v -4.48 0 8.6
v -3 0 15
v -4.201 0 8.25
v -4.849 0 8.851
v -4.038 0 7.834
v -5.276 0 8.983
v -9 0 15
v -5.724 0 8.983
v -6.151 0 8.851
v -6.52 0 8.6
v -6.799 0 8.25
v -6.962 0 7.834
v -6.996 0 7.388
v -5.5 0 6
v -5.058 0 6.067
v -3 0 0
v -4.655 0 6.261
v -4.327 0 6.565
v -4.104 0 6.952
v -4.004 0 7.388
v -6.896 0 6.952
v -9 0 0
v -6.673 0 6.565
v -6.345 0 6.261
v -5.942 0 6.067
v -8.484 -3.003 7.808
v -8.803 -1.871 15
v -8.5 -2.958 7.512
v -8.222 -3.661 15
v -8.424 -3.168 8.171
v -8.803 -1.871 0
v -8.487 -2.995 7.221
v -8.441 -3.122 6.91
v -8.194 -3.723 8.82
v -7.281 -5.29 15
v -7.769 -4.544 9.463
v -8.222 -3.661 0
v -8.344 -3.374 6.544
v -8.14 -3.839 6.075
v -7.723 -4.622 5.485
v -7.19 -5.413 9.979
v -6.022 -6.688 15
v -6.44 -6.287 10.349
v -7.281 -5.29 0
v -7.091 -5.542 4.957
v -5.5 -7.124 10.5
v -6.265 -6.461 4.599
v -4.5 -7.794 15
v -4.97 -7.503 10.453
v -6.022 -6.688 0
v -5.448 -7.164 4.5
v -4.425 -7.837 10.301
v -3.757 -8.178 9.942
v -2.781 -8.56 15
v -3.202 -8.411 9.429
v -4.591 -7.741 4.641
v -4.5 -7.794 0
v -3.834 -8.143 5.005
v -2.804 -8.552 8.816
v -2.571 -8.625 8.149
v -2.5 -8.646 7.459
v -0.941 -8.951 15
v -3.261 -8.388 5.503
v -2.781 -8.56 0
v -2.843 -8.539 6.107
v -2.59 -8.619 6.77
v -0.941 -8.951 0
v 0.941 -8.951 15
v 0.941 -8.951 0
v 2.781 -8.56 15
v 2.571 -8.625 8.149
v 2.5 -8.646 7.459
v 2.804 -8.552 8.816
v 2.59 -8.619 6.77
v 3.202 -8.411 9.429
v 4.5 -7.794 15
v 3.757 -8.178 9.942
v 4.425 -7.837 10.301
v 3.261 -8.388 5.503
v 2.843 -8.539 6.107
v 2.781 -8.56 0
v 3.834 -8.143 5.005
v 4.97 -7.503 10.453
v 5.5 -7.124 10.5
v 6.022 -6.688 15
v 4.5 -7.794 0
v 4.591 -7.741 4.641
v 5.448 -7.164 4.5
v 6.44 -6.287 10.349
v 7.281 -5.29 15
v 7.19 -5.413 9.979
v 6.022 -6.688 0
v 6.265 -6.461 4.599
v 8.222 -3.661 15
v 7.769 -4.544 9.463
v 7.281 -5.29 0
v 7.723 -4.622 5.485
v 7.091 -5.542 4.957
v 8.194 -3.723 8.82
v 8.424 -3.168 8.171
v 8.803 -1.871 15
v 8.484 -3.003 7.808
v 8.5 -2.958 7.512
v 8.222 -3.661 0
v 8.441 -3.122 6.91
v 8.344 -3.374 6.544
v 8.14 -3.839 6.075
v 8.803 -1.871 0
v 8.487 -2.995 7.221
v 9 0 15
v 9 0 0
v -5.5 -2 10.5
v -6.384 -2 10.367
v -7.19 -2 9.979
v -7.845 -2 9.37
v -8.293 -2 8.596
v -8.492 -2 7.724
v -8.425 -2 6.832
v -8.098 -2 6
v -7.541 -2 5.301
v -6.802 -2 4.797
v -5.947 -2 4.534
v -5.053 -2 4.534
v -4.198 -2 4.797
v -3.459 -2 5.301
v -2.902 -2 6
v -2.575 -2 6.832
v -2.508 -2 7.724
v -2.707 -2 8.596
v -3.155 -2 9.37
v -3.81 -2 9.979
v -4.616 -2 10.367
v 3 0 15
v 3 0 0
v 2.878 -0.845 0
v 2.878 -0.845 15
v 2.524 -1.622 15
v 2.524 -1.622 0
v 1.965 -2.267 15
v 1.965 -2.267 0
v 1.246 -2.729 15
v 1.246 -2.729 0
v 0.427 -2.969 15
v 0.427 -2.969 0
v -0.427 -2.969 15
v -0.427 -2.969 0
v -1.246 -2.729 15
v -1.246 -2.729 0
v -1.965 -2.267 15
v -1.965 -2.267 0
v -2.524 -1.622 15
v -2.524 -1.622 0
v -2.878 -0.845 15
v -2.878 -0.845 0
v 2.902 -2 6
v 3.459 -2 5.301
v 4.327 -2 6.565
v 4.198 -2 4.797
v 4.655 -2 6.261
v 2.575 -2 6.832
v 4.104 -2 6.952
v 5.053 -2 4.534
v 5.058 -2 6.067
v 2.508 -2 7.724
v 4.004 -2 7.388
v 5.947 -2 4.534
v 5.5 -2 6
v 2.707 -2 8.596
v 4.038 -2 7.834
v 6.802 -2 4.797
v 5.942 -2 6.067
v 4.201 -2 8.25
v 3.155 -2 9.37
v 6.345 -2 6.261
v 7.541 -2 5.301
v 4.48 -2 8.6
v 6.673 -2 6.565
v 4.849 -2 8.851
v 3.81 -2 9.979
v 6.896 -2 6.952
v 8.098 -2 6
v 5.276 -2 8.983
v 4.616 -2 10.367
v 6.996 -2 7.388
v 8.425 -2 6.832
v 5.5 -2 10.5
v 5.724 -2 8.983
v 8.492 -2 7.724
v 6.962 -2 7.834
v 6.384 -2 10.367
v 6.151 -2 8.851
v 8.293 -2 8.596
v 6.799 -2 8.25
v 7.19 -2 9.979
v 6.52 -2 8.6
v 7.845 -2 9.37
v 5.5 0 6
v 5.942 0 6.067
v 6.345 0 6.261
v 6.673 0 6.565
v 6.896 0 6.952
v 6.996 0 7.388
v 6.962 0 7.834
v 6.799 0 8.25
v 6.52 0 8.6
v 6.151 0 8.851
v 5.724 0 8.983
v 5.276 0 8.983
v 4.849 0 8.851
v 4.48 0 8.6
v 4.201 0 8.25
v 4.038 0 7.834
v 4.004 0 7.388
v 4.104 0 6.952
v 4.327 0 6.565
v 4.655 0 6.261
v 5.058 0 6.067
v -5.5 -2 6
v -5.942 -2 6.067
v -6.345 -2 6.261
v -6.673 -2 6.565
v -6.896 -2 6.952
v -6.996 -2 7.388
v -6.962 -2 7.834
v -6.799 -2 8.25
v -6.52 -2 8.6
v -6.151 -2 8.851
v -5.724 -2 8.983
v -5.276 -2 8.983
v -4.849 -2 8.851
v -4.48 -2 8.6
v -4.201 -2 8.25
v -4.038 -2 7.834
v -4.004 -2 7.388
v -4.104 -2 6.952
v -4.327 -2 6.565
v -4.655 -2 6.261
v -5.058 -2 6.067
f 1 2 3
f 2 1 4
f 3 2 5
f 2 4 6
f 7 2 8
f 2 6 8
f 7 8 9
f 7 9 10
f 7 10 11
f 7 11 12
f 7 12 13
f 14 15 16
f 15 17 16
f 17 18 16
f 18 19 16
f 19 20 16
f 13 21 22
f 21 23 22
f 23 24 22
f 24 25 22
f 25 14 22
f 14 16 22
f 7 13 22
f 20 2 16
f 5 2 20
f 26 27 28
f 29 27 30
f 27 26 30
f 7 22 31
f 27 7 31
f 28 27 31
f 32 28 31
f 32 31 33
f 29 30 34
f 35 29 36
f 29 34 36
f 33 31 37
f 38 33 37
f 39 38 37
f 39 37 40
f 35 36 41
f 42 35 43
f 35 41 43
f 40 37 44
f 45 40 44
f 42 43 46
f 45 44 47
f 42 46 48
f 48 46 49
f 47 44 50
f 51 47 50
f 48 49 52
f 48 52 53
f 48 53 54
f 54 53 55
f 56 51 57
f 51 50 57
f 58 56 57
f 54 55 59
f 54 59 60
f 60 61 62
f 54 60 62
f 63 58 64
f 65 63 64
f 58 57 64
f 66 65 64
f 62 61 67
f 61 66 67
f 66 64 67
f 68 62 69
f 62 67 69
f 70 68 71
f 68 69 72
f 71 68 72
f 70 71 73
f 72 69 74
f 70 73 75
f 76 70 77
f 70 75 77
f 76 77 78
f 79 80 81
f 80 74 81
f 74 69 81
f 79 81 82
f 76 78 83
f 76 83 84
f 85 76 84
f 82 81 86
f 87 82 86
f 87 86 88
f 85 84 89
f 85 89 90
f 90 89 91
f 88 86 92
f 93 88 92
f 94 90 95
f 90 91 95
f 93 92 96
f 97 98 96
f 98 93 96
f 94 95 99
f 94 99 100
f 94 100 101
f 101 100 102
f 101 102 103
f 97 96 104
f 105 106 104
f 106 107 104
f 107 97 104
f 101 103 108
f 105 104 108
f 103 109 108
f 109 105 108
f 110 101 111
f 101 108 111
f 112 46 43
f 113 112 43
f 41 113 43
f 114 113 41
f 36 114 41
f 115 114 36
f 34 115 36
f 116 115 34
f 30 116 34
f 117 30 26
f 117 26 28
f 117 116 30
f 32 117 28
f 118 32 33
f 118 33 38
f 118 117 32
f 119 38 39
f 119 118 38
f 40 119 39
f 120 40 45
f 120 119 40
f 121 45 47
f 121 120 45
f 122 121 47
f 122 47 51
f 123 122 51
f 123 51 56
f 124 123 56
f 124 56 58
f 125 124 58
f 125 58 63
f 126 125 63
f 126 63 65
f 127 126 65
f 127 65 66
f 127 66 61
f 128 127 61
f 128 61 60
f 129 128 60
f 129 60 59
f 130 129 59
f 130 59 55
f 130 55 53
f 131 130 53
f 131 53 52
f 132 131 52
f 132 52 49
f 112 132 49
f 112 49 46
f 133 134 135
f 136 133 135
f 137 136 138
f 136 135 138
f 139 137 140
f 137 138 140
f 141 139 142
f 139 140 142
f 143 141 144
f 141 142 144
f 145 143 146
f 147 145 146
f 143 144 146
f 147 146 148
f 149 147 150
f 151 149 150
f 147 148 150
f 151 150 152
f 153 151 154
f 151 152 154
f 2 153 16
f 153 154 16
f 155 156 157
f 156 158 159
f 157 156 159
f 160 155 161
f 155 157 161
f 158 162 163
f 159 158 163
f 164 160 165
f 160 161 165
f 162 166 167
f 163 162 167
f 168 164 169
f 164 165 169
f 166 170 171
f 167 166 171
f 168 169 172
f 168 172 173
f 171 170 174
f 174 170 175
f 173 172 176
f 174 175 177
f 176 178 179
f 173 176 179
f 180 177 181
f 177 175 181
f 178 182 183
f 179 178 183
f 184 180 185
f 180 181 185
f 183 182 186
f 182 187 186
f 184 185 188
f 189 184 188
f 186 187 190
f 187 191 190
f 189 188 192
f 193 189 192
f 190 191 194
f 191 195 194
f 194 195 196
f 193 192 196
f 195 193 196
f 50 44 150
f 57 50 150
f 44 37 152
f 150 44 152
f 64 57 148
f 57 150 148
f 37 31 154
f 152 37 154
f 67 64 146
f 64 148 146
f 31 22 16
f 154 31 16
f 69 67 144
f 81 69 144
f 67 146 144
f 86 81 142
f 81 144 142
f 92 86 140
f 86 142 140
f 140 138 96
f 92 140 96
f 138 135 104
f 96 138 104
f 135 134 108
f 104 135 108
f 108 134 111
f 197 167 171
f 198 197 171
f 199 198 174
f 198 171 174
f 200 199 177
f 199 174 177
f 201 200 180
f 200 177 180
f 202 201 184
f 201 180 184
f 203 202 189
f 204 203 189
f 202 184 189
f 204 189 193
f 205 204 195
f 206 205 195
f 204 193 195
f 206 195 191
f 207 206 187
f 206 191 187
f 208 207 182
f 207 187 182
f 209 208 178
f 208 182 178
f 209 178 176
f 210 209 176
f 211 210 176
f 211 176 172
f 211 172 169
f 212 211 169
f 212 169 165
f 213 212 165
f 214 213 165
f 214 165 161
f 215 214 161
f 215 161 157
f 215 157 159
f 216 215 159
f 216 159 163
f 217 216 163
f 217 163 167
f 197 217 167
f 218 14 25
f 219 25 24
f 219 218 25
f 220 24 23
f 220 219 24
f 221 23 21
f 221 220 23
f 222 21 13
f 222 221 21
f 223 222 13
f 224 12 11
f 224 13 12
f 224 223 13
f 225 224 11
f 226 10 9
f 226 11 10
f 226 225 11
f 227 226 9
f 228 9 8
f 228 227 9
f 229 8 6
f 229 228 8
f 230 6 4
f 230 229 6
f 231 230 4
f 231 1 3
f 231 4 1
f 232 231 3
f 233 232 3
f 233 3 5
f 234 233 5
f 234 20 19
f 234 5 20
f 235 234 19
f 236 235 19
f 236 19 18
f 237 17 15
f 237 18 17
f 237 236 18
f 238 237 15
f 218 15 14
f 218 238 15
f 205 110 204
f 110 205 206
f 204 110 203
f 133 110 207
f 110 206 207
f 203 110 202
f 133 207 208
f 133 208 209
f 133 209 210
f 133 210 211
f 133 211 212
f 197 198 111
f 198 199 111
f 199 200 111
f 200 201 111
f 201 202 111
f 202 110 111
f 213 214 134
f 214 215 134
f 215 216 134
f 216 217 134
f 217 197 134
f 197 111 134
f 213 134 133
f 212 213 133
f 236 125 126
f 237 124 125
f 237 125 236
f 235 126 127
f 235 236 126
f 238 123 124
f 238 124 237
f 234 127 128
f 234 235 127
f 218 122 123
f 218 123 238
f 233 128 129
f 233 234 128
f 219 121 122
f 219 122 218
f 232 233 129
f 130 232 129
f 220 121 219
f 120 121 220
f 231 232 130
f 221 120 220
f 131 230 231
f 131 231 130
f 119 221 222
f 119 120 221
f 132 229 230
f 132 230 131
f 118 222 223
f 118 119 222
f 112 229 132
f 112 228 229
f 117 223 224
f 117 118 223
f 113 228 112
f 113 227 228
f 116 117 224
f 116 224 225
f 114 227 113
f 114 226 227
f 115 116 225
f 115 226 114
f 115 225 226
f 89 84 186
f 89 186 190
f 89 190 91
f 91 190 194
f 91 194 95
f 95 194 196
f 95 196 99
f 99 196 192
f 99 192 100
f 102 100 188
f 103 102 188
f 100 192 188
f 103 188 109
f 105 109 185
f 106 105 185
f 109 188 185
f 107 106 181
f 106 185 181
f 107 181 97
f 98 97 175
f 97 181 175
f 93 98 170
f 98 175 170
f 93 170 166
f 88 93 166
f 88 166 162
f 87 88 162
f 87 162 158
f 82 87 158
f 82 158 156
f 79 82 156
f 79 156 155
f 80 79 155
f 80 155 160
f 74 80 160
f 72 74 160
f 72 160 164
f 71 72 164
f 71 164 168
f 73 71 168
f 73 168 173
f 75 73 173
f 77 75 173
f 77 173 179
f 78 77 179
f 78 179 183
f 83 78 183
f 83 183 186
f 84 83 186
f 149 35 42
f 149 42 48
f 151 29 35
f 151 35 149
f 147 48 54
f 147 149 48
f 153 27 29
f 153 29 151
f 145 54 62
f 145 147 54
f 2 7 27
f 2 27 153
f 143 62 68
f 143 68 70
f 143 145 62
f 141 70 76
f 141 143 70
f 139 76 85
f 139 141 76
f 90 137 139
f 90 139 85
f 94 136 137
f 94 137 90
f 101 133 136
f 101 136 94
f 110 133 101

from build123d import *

# Parameters (mm, degrees)
BOSS_EXTRUDE1_DEPTH = 15
SKETCH2_R           = 3
CUT_EXTRUDE1_DEPTH  = 15
SKETCH3_R           = 1.5
CUT_EXTRUDE2_DEPTH  = 15


with BuildPart() as part:
    # Sketch1 → Boss-Extrude1 (new body)
    with BuildSketch(Plane.XY):
        with BuildLine():
            Line((9, 0), (3, 0))
            ThreePointArc((3, 0), (0, -3), (-3, 0))
            Line((-3, 0), (-9, 0))
            ThreePointArc((-9, 0), (0, -9), (9, 0))
        make_face()
    extrude(amount=BOSS_EXTRUDE1_DEPTH)

    # Sketch2 → Cut-Extrude1 (cut)
    with BuildSketch(Plane(origin=(0, -2, 0), x_dir=(1, 0, 0), z_dir=(0, 1, 0))):
        with Locations(Location((5.5, -7.5, 0), (0, 0, 270))):
            Circle(SKETCH2_R)
    cut_extrude1 = extrude(amount=-CUT_EXTRUDE1_DEPTH, mode=Mode.SUBTRACT)

    # Sketch3 → Cut-Extrude2 (cut)
    with BuildSketch(Plane.XZ.offset(2)):
        with Locations(Location((5.5, 7.5, 0), (0, 0, 270))):
            Circle(SKETCH3_R)
    cut_extrude2 = extrude(amount=-CUT_EXTRUDE2_DEPTH, mode=Mode.SUBTRACT)

    # Mirror1: Cut-Extrude1, Cut-Extrude2 across plane
    add(cut_extrude1.mirror(Plane(origin=(0, 0, 0), x_dir=(0, 0, 1), z_dir=(1, 0, 0))), mode=Mode.SUBTRACT)
    add(cut_extrude2.mirror(Plane(origin=(0, 0, 0), x_dir=(0, 0, 1), z_dir=(1, 0, 0))), mode=Mode.SUBTRACT)


solid = part.part
